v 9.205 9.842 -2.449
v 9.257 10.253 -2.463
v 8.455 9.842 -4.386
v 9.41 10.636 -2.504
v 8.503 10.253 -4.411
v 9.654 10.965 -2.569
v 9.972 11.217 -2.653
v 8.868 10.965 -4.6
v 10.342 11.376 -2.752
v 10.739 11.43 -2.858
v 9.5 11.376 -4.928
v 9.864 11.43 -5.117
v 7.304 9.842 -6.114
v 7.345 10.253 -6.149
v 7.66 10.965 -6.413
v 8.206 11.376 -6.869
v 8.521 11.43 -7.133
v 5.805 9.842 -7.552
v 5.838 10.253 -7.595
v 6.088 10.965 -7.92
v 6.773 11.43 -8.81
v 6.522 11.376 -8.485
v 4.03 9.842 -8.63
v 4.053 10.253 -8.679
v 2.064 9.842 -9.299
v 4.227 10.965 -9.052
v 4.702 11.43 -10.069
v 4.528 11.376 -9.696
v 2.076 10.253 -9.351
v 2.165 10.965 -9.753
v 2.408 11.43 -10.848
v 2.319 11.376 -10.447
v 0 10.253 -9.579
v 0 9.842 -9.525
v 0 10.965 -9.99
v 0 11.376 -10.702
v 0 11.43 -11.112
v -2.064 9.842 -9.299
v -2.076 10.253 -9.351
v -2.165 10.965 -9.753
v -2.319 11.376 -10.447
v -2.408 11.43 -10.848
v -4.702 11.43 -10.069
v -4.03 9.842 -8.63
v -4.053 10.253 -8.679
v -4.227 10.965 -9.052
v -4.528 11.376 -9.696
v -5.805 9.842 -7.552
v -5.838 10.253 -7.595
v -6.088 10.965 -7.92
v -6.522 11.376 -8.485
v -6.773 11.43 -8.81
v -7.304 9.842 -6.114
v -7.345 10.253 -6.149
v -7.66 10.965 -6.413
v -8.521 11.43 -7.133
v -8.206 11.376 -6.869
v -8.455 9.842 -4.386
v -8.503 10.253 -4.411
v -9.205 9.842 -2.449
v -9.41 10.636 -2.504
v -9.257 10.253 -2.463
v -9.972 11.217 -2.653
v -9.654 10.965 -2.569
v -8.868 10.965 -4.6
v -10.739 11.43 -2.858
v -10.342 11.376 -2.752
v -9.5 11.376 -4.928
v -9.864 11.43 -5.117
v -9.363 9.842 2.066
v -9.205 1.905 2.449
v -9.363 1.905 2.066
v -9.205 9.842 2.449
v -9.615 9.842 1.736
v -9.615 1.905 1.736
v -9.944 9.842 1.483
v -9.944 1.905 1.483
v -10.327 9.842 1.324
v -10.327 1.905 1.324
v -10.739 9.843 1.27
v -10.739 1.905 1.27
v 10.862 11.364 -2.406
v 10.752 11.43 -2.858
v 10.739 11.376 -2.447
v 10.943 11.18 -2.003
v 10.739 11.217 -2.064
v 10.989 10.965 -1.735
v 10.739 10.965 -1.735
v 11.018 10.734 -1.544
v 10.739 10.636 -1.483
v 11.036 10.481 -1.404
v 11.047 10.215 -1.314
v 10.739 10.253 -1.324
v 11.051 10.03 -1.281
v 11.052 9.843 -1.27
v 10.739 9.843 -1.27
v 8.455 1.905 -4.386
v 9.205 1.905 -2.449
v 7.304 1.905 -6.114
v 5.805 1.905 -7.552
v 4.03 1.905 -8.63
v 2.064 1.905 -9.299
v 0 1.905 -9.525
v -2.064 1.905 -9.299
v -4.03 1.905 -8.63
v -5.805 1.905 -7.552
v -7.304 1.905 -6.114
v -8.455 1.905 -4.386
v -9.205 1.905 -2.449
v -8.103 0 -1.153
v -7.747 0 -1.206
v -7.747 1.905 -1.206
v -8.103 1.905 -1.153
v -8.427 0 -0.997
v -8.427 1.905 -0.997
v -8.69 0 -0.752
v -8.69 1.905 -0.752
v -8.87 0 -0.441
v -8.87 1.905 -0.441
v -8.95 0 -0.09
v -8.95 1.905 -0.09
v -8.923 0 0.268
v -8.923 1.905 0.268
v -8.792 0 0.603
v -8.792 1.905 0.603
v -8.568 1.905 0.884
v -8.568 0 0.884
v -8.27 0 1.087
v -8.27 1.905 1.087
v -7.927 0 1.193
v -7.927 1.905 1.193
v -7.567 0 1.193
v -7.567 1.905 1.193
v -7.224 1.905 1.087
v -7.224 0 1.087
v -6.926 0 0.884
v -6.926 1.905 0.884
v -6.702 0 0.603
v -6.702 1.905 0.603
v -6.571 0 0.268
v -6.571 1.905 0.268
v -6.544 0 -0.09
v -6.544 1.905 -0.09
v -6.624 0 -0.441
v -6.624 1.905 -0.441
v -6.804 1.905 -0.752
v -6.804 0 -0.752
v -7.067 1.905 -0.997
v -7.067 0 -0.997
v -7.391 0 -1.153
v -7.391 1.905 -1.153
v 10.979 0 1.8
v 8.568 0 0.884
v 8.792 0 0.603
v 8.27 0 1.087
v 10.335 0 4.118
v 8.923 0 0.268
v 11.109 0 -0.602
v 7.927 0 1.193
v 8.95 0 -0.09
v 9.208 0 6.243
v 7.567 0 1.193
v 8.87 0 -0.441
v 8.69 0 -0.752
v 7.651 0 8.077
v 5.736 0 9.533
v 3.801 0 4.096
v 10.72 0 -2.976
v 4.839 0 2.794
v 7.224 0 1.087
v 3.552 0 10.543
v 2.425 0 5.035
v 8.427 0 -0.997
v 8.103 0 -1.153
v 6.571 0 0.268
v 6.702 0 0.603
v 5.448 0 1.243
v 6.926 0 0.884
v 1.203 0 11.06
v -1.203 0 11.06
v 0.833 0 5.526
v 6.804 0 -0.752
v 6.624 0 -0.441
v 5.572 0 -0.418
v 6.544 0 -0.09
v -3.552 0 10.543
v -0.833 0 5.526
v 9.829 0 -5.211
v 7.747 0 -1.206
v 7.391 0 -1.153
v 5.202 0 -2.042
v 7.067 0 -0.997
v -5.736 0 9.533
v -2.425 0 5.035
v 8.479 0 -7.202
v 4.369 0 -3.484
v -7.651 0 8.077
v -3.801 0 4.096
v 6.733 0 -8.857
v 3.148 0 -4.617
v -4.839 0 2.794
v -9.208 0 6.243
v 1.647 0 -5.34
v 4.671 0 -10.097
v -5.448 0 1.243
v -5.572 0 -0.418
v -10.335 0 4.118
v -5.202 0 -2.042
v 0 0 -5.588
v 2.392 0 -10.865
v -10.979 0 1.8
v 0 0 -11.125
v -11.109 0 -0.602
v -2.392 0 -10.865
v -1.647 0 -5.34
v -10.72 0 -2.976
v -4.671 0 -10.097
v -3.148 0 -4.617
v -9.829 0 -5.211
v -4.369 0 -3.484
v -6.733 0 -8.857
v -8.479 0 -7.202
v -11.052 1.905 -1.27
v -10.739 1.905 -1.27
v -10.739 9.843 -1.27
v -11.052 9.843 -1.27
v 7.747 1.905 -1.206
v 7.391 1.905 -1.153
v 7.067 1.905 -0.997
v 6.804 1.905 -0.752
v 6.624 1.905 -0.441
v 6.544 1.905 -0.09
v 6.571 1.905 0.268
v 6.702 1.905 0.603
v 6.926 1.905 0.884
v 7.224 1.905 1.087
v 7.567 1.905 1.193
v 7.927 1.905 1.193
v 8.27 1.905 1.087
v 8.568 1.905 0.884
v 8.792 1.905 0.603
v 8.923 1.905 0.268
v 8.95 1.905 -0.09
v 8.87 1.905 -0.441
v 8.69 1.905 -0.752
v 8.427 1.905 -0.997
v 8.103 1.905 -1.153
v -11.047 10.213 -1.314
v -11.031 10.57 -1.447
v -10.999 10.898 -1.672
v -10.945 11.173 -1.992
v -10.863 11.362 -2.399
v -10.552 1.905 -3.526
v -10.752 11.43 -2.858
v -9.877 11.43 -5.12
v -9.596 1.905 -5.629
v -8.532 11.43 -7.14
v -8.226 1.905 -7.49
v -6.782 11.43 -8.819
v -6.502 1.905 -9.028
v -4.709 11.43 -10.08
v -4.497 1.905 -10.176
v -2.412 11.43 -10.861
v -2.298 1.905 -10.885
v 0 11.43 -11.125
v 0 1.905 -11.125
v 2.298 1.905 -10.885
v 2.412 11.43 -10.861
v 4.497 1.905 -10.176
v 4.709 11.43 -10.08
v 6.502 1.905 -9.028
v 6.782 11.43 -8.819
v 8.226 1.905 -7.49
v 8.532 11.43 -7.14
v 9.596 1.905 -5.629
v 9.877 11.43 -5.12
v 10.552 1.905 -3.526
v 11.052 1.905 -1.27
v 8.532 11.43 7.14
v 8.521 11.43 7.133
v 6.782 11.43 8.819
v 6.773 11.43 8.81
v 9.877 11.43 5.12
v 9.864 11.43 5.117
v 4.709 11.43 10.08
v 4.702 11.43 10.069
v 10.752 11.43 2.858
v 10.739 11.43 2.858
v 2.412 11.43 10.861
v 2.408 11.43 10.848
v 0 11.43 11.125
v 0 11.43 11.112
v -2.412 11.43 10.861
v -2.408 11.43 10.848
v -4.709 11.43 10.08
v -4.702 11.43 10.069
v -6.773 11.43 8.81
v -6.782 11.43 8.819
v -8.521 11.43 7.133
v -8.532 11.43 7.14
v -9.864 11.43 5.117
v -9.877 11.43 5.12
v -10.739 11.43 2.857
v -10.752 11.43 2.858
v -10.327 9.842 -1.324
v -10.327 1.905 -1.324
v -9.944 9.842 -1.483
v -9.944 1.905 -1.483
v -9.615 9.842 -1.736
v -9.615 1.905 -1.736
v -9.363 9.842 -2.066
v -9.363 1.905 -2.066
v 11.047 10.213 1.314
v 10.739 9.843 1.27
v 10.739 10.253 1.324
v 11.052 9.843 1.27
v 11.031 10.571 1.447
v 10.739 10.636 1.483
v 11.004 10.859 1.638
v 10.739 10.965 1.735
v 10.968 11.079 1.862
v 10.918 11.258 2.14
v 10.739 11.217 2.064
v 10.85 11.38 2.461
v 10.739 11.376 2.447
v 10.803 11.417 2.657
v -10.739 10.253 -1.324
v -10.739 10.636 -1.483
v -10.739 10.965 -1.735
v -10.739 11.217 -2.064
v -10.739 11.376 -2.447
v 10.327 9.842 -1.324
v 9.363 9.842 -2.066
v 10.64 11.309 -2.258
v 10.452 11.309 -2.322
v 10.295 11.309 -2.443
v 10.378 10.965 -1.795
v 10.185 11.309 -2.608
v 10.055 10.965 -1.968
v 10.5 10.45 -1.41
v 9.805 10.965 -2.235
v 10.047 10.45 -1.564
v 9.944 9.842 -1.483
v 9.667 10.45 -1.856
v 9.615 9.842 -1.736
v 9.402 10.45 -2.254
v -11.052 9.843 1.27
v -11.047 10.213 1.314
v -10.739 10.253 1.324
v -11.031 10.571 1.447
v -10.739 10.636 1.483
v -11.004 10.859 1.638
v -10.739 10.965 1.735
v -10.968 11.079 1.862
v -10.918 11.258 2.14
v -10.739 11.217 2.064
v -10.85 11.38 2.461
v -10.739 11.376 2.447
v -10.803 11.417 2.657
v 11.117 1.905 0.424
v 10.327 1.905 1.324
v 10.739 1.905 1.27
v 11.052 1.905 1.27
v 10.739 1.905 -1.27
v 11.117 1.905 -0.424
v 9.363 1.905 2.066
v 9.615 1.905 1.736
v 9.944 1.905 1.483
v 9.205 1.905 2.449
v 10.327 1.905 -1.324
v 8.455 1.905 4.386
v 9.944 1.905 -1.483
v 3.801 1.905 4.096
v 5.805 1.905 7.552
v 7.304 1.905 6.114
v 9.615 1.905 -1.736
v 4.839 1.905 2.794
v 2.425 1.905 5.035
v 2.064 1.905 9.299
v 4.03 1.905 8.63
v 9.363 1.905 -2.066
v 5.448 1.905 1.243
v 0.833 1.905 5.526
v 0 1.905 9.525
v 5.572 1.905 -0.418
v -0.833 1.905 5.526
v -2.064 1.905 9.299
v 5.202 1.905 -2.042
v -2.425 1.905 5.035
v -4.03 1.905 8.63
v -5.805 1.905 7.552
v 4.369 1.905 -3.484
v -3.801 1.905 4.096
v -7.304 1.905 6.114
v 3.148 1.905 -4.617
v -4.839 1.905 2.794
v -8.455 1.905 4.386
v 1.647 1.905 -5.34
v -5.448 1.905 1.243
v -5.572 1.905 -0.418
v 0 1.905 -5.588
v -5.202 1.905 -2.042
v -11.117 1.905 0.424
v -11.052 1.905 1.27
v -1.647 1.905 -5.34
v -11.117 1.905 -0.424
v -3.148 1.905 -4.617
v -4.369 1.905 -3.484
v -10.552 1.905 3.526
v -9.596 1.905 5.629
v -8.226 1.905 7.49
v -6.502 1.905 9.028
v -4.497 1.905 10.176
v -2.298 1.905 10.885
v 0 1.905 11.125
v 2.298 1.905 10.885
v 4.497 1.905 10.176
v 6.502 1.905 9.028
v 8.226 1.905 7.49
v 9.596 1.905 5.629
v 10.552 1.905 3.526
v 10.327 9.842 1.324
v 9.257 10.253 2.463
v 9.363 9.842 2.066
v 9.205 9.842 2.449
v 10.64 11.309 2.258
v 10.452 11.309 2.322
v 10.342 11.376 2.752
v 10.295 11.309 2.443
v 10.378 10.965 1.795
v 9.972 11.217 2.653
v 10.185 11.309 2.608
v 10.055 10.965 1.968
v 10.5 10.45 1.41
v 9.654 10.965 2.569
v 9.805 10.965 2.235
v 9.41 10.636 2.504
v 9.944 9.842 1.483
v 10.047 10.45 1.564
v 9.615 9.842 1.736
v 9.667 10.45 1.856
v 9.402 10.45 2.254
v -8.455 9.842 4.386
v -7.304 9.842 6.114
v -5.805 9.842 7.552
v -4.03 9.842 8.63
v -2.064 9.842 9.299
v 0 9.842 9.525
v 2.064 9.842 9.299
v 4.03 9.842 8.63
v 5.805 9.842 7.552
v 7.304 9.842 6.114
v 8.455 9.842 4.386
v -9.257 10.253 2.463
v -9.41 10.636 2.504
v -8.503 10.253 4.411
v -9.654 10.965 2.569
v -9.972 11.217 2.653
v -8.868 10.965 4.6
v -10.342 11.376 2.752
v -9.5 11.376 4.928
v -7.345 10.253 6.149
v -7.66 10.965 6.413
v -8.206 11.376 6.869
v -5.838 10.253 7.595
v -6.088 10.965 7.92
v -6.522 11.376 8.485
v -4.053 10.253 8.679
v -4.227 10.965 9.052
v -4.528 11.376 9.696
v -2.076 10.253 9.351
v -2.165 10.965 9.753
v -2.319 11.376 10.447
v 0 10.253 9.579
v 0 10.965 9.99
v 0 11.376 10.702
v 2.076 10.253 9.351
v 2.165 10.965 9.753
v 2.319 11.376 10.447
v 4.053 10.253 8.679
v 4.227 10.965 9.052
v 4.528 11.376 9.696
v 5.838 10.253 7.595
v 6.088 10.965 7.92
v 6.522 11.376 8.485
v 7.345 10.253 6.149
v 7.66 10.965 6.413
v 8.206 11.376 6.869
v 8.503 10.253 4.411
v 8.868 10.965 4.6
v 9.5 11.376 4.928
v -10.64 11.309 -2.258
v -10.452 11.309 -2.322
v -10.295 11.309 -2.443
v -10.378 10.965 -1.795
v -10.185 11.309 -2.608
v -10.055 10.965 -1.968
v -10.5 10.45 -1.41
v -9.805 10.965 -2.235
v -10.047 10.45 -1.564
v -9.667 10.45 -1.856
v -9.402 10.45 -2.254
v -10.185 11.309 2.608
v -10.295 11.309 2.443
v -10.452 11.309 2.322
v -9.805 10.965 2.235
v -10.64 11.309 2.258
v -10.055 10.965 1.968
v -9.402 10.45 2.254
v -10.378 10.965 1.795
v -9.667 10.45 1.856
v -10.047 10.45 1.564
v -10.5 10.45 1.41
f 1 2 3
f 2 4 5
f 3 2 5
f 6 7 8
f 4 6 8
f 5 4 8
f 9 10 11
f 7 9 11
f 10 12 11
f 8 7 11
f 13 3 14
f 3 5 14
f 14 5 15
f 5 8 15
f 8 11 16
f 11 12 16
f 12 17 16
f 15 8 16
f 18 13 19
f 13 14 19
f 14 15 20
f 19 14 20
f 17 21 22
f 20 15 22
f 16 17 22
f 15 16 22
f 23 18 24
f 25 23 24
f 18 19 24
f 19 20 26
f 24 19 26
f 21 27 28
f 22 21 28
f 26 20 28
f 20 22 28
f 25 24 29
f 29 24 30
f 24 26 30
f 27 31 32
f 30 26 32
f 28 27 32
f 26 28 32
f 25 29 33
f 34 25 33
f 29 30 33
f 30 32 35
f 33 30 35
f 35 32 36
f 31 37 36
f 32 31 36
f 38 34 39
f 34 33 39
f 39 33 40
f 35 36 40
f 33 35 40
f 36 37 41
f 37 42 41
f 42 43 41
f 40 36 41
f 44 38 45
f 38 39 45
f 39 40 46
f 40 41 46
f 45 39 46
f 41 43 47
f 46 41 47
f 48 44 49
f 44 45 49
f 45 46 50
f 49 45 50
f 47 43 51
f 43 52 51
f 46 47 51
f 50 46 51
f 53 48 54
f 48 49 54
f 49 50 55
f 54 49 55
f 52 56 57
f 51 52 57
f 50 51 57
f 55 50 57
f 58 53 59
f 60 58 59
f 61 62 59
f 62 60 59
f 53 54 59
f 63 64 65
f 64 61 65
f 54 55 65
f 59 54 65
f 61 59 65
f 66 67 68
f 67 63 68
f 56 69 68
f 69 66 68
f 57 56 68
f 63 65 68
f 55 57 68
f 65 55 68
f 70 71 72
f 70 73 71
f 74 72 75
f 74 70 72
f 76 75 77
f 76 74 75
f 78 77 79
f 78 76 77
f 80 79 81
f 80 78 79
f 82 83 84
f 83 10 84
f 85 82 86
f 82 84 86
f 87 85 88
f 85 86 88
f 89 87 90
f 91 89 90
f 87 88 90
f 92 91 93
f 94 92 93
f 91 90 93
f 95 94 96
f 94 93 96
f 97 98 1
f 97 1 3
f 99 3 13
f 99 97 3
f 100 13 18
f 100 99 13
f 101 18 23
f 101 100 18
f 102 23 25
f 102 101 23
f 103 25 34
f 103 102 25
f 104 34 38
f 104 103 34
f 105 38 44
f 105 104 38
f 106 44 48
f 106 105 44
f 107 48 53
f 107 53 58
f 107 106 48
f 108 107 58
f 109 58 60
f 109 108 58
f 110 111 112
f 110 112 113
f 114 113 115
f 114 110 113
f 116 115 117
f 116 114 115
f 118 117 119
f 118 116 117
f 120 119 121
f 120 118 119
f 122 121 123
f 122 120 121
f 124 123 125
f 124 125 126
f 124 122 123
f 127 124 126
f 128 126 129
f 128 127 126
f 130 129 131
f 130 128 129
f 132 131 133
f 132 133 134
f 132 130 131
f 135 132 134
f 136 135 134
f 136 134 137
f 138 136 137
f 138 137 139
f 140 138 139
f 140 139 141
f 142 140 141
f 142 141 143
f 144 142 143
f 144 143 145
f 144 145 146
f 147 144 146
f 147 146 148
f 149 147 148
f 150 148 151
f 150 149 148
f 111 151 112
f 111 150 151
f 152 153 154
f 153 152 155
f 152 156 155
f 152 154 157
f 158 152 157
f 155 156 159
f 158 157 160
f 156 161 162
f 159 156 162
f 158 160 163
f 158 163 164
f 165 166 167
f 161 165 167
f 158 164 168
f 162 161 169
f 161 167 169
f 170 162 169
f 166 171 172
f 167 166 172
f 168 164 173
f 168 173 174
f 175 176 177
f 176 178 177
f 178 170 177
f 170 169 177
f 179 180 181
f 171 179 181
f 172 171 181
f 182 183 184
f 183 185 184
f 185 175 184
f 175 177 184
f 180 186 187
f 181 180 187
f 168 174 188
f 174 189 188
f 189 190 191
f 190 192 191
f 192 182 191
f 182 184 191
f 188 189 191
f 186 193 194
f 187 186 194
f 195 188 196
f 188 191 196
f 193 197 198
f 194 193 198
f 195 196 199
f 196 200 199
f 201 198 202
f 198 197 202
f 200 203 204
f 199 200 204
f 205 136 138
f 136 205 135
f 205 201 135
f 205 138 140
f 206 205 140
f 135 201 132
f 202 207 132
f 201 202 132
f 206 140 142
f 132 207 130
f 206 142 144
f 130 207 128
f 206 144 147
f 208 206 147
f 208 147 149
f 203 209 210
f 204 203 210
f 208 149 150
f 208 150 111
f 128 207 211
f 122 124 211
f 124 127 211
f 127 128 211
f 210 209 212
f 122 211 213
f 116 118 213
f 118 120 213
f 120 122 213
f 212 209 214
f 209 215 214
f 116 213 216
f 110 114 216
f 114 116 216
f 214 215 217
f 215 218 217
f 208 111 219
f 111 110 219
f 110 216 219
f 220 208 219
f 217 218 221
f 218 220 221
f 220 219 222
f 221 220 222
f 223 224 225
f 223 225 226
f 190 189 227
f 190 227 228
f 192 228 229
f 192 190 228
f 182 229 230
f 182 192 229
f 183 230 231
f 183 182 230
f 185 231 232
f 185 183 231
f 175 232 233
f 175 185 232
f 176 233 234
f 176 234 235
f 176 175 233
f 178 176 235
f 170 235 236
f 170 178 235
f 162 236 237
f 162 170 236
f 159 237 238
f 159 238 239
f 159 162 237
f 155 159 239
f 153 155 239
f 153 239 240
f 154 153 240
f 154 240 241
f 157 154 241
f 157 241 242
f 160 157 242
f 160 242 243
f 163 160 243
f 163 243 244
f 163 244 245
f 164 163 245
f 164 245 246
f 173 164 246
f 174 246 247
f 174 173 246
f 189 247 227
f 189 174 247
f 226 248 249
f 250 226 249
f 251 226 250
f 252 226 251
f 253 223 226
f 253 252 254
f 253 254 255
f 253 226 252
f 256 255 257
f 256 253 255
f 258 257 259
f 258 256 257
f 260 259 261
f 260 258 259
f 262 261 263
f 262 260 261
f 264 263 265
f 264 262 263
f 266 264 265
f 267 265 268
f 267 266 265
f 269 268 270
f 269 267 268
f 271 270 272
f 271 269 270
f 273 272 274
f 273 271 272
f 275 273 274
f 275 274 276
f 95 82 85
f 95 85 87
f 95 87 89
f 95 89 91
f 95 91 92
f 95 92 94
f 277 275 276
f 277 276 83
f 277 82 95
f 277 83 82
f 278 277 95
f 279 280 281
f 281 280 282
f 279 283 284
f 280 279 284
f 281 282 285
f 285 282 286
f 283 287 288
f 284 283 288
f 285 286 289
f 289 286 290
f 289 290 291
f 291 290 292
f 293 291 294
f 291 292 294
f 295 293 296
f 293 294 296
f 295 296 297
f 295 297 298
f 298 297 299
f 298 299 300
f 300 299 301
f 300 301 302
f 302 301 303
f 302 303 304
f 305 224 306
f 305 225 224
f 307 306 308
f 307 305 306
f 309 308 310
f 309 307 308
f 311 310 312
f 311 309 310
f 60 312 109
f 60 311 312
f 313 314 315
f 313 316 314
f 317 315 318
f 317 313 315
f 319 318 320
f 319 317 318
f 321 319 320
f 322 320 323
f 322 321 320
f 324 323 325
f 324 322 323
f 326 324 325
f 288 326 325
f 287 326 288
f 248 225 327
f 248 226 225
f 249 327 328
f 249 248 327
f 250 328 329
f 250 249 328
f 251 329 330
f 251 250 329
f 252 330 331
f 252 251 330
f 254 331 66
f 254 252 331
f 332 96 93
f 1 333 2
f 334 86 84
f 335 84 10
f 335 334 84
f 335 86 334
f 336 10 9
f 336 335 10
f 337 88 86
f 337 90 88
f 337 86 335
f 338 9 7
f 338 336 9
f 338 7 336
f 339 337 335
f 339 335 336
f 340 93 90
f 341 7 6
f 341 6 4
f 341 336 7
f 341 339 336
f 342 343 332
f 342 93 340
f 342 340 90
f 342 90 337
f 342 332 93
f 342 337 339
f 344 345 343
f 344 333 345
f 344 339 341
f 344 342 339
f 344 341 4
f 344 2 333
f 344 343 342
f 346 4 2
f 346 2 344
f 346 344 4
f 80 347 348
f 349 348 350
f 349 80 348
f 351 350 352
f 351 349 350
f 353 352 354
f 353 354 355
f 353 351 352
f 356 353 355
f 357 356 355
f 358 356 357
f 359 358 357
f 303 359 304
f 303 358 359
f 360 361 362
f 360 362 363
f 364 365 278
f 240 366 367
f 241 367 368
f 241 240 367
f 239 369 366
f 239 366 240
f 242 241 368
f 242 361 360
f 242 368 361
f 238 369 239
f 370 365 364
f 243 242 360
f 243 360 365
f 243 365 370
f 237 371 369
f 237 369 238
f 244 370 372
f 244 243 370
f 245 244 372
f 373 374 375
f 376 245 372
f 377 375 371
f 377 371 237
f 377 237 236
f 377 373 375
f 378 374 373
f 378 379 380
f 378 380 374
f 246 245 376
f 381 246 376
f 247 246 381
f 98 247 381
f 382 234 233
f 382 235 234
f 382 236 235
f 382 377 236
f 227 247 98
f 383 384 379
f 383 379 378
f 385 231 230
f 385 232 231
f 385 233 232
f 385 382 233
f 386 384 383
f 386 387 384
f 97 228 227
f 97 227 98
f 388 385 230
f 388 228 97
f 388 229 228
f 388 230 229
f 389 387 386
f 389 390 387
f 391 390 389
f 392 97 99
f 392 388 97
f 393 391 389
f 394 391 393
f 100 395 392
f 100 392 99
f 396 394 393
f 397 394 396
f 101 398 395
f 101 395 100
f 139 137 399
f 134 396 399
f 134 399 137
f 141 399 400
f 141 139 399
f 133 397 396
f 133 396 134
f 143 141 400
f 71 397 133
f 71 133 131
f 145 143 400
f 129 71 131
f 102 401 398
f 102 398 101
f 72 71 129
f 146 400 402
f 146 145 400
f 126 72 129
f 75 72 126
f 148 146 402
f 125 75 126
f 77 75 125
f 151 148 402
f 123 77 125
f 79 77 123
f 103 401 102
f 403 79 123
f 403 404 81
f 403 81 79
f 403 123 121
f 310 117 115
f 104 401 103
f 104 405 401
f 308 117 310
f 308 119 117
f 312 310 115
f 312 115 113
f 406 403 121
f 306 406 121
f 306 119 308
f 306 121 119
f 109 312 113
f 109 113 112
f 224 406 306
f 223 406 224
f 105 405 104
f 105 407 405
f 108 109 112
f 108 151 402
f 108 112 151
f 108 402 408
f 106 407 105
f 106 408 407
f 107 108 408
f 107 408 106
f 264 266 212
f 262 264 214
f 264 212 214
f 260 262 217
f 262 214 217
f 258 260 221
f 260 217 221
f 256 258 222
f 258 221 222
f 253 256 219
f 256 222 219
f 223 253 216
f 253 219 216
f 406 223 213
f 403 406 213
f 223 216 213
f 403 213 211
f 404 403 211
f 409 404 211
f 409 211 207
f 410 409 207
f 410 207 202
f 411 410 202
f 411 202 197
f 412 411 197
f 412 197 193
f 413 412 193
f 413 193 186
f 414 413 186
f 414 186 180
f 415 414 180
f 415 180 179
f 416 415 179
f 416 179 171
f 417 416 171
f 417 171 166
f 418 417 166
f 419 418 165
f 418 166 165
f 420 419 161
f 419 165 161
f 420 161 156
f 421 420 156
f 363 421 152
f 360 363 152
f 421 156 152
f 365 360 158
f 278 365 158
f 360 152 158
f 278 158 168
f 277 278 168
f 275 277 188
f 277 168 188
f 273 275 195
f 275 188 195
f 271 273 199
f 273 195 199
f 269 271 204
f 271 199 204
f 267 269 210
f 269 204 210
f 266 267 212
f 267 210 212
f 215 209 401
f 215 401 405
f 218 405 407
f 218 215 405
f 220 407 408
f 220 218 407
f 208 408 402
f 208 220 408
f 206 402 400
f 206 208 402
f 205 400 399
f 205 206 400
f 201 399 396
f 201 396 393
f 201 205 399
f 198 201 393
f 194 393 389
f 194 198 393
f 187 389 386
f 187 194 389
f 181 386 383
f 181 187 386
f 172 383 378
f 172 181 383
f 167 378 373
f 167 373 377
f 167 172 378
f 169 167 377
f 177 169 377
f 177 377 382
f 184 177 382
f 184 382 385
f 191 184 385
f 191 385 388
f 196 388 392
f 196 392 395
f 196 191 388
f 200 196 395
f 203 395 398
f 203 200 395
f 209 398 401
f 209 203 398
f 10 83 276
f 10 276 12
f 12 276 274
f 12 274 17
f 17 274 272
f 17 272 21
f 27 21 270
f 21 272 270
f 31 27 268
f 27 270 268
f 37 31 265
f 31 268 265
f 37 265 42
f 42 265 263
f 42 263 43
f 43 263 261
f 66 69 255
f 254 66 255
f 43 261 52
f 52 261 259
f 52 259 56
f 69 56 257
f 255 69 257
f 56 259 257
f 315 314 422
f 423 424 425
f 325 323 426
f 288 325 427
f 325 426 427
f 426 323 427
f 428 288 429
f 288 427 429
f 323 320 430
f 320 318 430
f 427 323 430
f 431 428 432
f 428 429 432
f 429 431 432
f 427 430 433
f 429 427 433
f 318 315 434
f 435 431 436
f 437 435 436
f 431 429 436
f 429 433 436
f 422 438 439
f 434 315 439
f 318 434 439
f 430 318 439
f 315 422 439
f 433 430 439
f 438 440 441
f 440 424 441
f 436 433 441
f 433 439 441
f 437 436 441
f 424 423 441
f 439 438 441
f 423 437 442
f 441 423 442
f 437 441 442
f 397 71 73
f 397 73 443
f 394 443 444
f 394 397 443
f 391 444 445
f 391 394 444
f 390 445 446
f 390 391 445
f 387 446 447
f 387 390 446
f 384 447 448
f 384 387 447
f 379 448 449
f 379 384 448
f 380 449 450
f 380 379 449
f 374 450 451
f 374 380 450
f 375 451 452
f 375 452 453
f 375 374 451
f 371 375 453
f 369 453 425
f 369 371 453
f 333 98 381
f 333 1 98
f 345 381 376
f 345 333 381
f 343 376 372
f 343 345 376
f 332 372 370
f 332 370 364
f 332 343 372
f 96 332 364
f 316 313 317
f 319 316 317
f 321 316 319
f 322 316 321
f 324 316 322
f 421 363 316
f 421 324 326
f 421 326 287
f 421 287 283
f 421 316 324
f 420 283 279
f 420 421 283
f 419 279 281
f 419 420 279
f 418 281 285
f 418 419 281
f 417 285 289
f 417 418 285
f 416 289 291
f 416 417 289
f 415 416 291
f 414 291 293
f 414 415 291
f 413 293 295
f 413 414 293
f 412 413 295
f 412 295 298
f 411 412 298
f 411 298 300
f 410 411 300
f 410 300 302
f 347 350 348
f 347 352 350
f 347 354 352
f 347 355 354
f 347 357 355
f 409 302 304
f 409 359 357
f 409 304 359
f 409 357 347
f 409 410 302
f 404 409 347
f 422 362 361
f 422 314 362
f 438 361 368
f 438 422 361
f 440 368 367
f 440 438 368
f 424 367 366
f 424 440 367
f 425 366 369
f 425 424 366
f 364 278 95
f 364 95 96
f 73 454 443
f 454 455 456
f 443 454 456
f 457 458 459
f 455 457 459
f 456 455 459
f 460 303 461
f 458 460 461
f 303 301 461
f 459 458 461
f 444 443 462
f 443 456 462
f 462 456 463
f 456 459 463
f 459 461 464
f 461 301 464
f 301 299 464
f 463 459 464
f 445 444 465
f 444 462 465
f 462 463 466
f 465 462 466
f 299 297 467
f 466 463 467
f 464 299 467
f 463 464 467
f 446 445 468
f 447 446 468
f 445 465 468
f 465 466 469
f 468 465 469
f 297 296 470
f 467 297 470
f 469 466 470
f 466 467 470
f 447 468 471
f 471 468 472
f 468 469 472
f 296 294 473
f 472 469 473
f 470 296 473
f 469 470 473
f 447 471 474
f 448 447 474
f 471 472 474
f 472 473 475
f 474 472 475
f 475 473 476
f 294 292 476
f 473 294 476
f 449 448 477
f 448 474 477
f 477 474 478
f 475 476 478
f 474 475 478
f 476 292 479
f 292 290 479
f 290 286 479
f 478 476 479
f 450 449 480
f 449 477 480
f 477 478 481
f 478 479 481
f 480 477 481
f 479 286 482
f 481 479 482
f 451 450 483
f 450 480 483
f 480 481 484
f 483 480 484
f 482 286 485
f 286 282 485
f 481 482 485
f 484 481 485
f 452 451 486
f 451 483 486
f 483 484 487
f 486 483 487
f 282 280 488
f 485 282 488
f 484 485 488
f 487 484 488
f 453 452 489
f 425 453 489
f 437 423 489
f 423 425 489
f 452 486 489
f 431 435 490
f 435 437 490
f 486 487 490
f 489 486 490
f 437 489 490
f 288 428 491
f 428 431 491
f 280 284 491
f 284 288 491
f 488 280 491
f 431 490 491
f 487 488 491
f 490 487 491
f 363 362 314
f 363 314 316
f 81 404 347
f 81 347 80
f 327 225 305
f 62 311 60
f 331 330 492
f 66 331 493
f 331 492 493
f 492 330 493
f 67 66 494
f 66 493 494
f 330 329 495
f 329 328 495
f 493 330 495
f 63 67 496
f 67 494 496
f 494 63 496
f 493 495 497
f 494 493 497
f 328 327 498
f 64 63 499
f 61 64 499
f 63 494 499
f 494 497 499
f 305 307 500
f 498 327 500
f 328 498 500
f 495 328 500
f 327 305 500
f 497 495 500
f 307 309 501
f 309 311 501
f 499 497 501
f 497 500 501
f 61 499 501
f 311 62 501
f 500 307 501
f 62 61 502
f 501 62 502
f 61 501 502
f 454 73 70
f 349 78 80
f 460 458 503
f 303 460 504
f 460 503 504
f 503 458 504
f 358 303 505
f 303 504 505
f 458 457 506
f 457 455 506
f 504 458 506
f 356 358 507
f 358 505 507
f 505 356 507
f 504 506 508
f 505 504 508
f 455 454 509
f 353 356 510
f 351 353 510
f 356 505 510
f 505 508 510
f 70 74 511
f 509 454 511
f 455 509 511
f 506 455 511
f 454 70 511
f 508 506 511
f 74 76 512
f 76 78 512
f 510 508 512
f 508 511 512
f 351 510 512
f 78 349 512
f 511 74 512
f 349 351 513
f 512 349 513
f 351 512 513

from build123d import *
from build123d.topology import SkipClean

# Parameters (mm, degrees)
SKETCH1_R           = 11.1252
SKETCH1_R_2         = 5.588
SKETCH1_R_3         = 1.2065
BOSS_EXTRUDE1_DEPTH = 1.905
BOSS_EXTRUDE2_DEPTH = 9.525
FILLET1_R           = 1.5875


with BuildPart() as part:
    # Sketch1 → Boss-Extrude1 (new body)
    with BuildSketch(Plane(origin=(0, 0, 0), x_dir=(1, 0, 0), z_dir=(0, 1, 0))):
        with Locations(Location((0, 0, 0), (0, 0, 90))):
            Circle(SKETCH1_R)
        with Locations(Location((0, 0, 0), (0, 0, 90))):
            Circle(SKETCH1_R_2, mode=Mode.SUBTRACT)
        with Locations(Location((-7.747, 0, 0), (0, 0, 90))):
            Circle(SKETCH1_R_3, mode=Mode.SUBTRACT)
        with Locations(Location((7.747, 0, 0), (0, 0, 90))):
            Circle(SKETCH1_R_3, mode=Mode.SUBTRACT)
    extrude(amount=BOSS_EXTRUDE1_DEPTH)

    # Sketch2 → Boss-Extrude2 (add)
    with SkipClean():  # the faces are left unmerged after this step: merging them gives an invalid solid
        with BuildSketch(Plane(origin=(0, 1.905, 0), x_dir=(1, 0, 0), z_dir=(0, 1, 0))):
            with BuildLine():
                Line((-9.439954, 1.27), (-11.052474, 1.27))
                ThreePointArc((-11.052474, 1.27), (0, 11.1252), (11.052474, 1.27))
                Line((11.052474, 1.27), (9.439954, 1.27))
                ThreePointArc((9.439954, 1.27), (0, 9.525), (-9.439954, 1.27))
            make_face()
            with BuildLine():
                Line((9.439954, -1.27), (11.052474, -1.27))
                ThreePointArc((11.052474, -1.27), (0, -11.1252), (-11.052474, -1.27))
                Line((-11.052474, -1.27), (-9.439954, -1.27))
                ThreePointArc((-9.439954, -1.27), (0, -9.525), (9.439954, -1.27))
            make_face()
        extrude(amount=BOSS_EXTRUDE2_DEPTH)

    # Fillet1
    fillet1_edges = [part.edges().sort_by_distance(p)[0] for p in [
        (10.246214, 11.43, 1.27),
        (10.246214, 11.43, -1.27),
        (-10.246214, 11.43, -1.27),
        (0, 11.43, -9.525),
        (0, 11.43, 9.525),
        (-10.246214, 11.43, 1.27),
        (9.439954, 6.6675, -1.27),
        (-9.439954, 6.6675, -1.27),
        (-9.439954, 6.6675, 1.27),
        (9.439954, 6.6675, 1.27),
    ]]
    fillet(fillet1_edges, radius=FILLET1_R)


solid = part.part
